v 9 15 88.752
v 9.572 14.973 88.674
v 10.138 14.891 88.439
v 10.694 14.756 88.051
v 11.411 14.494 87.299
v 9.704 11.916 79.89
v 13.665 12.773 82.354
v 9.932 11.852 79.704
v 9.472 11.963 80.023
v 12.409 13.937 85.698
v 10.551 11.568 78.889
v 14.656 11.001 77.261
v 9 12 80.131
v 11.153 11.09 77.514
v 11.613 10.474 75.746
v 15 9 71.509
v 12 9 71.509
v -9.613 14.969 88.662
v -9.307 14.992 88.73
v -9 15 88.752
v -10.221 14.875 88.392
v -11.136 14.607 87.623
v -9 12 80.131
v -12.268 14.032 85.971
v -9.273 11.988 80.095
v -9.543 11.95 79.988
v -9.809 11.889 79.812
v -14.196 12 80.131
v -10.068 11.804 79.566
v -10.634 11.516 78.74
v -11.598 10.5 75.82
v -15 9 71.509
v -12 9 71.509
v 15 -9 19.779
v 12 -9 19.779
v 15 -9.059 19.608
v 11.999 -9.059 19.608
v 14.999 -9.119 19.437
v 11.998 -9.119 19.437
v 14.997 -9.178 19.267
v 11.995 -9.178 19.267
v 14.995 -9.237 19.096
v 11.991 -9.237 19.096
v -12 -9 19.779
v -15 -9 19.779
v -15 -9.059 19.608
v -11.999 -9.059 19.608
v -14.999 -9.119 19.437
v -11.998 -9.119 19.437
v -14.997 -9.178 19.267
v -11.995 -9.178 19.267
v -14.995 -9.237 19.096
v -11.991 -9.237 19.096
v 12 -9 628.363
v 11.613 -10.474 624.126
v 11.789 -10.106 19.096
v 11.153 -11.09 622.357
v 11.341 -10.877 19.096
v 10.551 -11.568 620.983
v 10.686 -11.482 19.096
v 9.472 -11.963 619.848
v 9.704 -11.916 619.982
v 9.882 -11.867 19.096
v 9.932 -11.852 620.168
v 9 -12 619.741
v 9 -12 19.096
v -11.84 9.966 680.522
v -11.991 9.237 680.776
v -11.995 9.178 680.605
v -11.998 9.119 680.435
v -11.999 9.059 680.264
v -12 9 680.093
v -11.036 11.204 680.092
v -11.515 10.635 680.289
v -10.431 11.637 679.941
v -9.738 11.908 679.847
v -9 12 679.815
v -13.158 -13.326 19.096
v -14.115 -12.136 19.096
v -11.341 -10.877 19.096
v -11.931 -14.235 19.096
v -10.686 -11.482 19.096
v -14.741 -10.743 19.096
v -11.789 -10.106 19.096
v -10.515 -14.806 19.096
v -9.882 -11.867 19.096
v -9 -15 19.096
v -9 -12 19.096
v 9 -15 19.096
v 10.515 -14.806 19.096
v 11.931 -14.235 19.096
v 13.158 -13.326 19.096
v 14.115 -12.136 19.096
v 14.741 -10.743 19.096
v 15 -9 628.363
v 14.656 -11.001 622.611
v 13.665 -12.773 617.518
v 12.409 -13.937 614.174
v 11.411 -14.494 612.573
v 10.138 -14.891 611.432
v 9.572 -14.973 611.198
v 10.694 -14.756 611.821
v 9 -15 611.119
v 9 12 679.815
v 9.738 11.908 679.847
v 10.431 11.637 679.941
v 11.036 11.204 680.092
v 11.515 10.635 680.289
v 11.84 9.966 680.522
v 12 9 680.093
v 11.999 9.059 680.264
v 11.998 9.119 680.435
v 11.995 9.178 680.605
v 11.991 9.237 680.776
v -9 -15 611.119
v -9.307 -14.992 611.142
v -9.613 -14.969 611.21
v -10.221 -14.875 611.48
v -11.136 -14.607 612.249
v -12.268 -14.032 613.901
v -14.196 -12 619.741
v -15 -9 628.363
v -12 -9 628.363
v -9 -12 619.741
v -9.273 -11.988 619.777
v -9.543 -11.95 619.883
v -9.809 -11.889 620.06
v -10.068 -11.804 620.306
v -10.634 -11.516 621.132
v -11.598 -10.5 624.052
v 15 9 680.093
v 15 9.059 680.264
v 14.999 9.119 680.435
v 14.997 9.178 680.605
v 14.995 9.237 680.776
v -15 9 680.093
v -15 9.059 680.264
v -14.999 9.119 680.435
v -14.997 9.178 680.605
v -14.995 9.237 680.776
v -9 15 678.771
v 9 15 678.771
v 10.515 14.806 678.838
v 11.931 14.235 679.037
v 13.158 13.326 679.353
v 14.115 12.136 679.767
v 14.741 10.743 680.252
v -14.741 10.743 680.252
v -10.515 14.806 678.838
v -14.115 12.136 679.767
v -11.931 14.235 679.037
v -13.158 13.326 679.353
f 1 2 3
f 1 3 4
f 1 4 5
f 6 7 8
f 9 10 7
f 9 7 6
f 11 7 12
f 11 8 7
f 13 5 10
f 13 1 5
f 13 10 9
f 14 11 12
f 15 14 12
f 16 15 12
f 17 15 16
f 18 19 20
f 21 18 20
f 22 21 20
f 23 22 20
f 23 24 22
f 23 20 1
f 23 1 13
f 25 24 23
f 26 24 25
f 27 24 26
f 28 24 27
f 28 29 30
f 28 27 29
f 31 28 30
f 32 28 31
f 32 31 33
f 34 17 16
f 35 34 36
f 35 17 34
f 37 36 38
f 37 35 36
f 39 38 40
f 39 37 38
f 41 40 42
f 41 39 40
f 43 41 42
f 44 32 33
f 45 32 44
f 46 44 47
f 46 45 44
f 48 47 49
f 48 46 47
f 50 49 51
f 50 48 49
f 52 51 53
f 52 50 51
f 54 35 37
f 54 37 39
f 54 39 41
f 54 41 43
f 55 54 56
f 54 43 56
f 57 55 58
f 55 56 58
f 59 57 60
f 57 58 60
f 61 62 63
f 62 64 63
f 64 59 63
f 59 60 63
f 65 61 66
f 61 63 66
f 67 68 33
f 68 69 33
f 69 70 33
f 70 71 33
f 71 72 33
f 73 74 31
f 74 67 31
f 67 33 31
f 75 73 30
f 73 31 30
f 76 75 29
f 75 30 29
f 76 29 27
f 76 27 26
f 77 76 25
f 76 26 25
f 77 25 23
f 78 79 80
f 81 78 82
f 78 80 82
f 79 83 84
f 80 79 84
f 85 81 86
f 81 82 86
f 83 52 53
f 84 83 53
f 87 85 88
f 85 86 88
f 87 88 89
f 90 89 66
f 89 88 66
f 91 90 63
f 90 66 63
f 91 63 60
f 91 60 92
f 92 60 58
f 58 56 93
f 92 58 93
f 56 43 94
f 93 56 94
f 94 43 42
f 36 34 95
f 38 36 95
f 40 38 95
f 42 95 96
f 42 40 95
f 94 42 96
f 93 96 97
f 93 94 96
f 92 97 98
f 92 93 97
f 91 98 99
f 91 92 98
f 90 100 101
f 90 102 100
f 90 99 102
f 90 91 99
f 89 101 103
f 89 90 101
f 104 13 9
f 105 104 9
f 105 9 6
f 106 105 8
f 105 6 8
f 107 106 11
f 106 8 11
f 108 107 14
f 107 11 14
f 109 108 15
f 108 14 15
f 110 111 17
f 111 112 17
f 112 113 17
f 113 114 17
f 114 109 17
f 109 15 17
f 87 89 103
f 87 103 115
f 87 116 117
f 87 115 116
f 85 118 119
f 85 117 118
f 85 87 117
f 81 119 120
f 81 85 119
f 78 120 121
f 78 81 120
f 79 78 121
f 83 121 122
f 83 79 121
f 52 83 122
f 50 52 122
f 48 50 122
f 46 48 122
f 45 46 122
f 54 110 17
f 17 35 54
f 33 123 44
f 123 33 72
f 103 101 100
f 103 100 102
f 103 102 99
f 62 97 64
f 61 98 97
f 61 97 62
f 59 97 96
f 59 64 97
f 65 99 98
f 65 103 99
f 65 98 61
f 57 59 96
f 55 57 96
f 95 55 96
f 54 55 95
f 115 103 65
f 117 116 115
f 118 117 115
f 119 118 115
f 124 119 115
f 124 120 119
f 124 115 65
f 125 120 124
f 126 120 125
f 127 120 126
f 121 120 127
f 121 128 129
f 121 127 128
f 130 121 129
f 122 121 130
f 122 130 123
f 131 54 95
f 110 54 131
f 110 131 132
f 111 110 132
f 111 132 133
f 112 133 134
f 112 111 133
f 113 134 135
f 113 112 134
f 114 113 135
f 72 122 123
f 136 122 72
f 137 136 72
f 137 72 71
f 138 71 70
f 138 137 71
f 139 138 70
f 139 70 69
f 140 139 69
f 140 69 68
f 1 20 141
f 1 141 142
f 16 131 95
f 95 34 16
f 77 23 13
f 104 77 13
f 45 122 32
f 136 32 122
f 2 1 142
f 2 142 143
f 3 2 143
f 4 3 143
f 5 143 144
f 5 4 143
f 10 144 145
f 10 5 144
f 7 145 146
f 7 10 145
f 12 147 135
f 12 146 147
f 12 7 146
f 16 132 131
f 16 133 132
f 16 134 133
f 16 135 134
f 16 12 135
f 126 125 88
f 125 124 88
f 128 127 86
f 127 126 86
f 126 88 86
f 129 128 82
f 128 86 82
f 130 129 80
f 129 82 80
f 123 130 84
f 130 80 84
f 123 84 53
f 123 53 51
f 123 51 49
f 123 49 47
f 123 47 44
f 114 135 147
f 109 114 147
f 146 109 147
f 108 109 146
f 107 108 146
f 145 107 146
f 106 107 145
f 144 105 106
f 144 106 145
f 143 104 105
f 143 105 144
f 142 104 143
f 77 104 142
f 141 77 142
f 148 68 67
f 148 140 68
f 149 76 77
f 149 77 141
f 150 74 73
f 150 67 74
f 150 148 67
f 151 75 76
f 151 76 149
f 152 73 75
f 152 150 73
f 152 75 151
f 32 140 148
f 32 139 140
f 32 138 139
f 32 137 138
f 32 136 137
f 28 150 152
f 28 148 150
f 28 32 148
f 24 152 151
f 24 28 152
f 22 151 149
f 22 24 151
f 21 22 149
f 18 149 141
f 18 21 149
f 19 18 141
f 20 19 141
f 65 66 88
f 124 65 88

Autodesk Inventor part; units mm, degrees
ref_plane "Start Plane" through (0, 0, 19.0963) normal (0, 0, 1) x (1, 0, 0)
ref_plane "End Plane" through (0, 0, 680.7758) normal (0, 0, 1) x (1, 0, 0)
sketch "Sketch" plane through (0, 0, 0) normal (0, 0, 1) x (1, 0, 0)
  line L0 (-15, -9) -> (-15, 9)
  line L1 (-9, 15) -> (9, 15)
  line L2 (15, 9) -> (15, -9)
  line L3 (9, -15) -> (-9, -15)
  arc A0 (-15, -9) -> (-9, -15) centre (-9, -9) ccw
  arc A1 (-9, 15) -> (-15, 9) centre (-9, 9) ccw
  arc A2 (15, 9) -> (9, 15) centre (9, 9) ccw
  arc A3 (9, -15) -> (15, -9) centre (9, -9) ccw
  arc A4 (-9, 12) -> (-12, 9) centre (-9, 9) ccw
  line L4 (-9, 12) -> (9, 12)
  arc A5 (12, 9) -> (9, 12) centre (9, 9) ccw
  line L5 (12, 9) -> (12, -9)
  arc A6 (9, -12) -> (12, -9) centre (9, -9) ccw
  line L6 (9, -12) -> (-9, -12)
  arc A7 (-12, -9) -> (-9, -12) centre (-9, -9) ccw
  line L7 (-12, -9) -> (-12, 9)
  line L8 (0, 22.7397) -> (0, -22.7397) construction
  line L9 (-22.7397, 0) -> (22.7397, 0) construction
  dimension "d7" = 6
  dimension "d10" = 30
  dimension "d11" = 30
  dimension "d12" = 3
  dimension "d15" = 15
  dimension "d16" = 15
extrude "Body" add sketch "Sketch" along normal up to surface (661.6794 mm away) from surface at 19.0963
sketch "Sketch3" plane through (0, 0, 0) normal (0, 0, 1) x (1, 0, 0)
  line L0 (0, 0) -> (10, 0)
ref_plane "Work Plane3" through (0, 0, 0) normal (0, -1, 0) x (1, 0, 0)
ref_plane "Work Plane4" through (-9, -478.7803, -721.7447) normal (0, -0.9444582, 0.3286315) x (1, 0, 0)
split "Split1" plane through (-9, -478.7803, -721.7447) removes the side toward (0, -0.9444582, 0.3286315)
ref_plane "Work Plane5" through (9, -289.8887, -787.471) normal (0, 0.9444582, -0.3286315) x (1, 0, 0)
split "Split2" plane through (9, -289.8887, -787.471) removes the side toward (0, 0.9444582, -0.3286315)
ref_plane "Work Plane6" through (-9, -4.9295, 685.7053) normal (0, 0.3286315, 0.9444582) x (1, 0, 0)
split "Split3" plane through (-9, -4.9295, 685.7053) removes the side toward (0, 0.3286315, 0.9444582)
sketch "Sketch4" plane through (0, 0, 0) normal (0, -1, 0) x (1, 0, 0)
  line L0 (-2, 19.0963) -> (12, 19.0963) projected
  line L1 (-2, 680.7758) -> (12, 680.7758) projected
  dimension "d18" = 661.6794
equation "\"d7\" = G_IR"
equation "\"d10\" = G_H"
equation "\"d11\" = G_W"
equation "\"d12\" = G_T"
equation "\"d15\" = 0.5 * d10"
equation "\"d16\" = 0.5 * d11"
equation "\"d3\" = G_L"
equation "\"G_W\" = 30"
equation "\"G_H\" = 30"
equation "\"G_T\" = 3"
equation "\"G_IR\" = 6"
equation "\"G_L\" = d18"
equation "\"G_OFFSET_START\" = -19.09635"
equation "\"G_OFFSET_END\" = -19.09635"
equation "\"d13\" = -G_OFFSET_START"
equation "\"d14\" = G_OFFSET_END + B_L"
equation "\"B_L\" = 699.87213"
properties part number "DIN EN 10219-2 - 30 x 30 x 3  - 661.68" material "Steel, Mild"
